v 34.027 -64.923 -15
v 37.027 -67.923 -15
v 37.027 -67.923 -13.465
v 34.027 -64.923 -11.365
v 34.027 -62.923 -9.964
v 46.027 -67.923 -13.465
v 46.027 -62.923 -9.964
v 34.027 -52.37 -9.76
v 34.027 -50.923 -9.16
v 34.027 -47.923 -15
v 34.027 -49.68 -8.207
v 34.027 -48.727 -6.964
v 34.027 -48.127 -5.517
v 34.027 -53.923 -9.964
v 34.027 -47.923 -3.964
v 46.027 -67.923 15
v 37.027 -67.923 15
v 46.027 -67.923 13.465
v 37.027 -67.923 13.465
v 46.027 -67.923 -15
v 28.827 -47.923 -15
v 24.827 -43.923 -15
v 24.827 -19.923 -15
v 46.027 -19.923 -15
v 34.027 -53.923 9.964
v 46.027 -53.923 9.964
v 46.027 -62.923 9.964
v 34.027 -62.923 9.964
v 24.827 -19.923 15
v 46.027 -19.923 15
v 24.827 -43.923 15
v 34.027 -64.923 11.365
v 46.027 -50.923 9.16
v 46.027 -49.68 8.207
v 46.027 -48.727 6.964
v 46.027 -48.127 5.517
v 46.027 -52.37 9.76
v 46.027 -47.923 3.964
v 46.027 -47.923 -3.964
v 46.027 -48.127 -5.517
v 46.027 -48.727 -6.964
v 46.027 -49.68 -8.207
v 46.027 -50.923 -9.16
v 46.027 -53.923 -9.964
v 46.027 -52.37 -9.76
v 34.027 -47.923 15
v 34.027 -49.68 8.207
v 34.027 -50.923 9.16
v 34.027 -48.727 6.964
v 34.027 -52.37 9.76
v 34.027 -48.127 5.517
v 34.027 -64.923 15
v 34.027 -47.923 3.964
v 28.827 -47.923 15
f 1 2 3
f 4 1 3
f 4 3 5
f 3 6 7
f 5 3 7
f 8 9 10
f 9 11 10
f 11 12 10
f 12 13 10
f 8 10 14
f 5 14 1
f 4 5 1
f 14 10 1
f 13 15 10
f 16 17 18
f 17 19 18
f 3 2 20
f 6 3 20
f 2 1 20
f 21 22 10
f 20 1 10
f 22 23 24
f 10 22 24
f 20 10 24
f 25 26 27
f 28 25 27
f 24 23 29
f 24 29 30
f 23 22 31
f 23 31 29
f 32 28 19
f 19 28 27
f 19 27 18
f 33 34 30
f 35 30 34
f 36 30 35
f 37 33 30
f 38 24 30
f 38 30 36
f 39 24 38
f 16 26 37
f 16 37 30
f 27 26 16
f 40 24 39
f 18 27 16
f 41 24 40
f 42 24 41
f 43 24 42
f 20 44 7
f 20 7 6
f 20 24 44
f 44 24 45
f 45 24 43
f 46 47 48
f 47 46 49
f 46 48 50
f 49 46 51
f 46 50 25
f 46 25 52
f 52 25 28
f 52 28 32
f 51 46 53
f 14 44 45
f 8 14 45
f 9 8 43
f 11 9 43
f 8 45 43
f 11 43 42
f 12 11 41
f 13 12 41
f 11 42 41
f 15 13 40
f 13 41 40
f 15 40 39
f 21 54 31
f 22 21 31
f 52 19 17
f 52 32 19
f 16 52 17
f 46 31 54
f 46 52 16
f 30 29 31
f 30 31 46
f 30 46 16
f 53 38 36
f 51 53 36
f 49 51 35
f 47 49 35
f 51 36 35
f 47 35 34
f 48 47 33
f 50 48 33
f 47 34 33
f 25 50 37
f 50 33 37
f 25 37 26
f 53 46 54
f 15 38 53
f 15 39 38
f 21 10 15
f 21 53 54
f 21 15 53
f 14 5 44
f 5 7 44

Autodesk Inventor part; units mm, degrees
ref_plane "YZ Plane" through (0, 0, 0) normal (1, 0, 0) x (0, 1, 0)
ref_plane "XZ Plane" through (0, 0, 0) normal (0, 1, 0) x (-1, 0, 0)
ref_plane "XY Plane" through (0, 0, 0) normal (0, 0, 1) x (1, 0, 0)
sketch "Skizze1" plane through (0, 0, 0) normal (0, 0, 1) x (1, 0, 0)
  line L0 (24.8274, -43.9228) -> (24.8274, -19.9228)
  line L1 (24.8274, -19.9228) -> (46.0274, -19.9228)
  line L2 (46.0274, -19.9228) -> (46.0274, -67.9228)
  line L3 (34.0274, -47.9228) -> (28.8274, -47.9228)
  line L4 (28.8274, -47.9228) -> (24.8274, -43.9228)
  line L5 (34.0274, -47.9228) -> (34.0274, -67.9228)
  line L6 (34.0274, -67.9228) -> (46.0274, -67.9228)
  point P0 (0, 0)
  dimension "d0" = 45
  dimension "d1" = 4
  dimension "d2" = 21.2
  dimension "d7" = 28
  dimension "d8" = 20
  dimension "d9" = 12
extrude "Extrusion1" add sketch "Skizze1" along normal mid plane 30
sketch "Skizze2" plane through (46.0274, -67.9228, 15) normal (1, 0, 0) x (0, 0, -1)
  line L0 (5.0357, 14) -> (5.0357, 5)
  line L1 (5.0357, 5) -> (1.5346, 0)
  line L2 (1.5346, 0) -> (28.4654, 0)
  line L3 (0, 0) -> (30, 0) projected
  line L4 (28.4654, 0) -> (24.9643, 5)
  line L5 (24.9643, 5) -> (24.9643, 14)
  line L6 (24.9643, 14) -> (5.0357, 14) construction
  line L7 (15, -13.5846) -> (15, 81.5074) projected
  arc A0 (24.9643, 14) -> (18.9643, 20) centre (18.9643, 14) ccw
  line L8 (18.9643, 20) -> (11.0357, 20)
  arc A1 (11.0357, 20) -> (5.0357, 14) centre (11.0357, 14) ccw
  point P0 (15, 67.9228)
  dimension "d19" = 5
  dimension "d21" = 6
  dimension "d22" = 20
  dimension "d23" = 35
extrude "Extrusion2" cut sketch "Skizze2" against normal through all
chamfer "Fase1" distance 3 angle 45 2 edges at (34.0274, -67.9228, -14.2327) (34.0274, -67.9228, 14.2327)
properties part number "_WT_Aufnahme_Antriebseinheit6"
